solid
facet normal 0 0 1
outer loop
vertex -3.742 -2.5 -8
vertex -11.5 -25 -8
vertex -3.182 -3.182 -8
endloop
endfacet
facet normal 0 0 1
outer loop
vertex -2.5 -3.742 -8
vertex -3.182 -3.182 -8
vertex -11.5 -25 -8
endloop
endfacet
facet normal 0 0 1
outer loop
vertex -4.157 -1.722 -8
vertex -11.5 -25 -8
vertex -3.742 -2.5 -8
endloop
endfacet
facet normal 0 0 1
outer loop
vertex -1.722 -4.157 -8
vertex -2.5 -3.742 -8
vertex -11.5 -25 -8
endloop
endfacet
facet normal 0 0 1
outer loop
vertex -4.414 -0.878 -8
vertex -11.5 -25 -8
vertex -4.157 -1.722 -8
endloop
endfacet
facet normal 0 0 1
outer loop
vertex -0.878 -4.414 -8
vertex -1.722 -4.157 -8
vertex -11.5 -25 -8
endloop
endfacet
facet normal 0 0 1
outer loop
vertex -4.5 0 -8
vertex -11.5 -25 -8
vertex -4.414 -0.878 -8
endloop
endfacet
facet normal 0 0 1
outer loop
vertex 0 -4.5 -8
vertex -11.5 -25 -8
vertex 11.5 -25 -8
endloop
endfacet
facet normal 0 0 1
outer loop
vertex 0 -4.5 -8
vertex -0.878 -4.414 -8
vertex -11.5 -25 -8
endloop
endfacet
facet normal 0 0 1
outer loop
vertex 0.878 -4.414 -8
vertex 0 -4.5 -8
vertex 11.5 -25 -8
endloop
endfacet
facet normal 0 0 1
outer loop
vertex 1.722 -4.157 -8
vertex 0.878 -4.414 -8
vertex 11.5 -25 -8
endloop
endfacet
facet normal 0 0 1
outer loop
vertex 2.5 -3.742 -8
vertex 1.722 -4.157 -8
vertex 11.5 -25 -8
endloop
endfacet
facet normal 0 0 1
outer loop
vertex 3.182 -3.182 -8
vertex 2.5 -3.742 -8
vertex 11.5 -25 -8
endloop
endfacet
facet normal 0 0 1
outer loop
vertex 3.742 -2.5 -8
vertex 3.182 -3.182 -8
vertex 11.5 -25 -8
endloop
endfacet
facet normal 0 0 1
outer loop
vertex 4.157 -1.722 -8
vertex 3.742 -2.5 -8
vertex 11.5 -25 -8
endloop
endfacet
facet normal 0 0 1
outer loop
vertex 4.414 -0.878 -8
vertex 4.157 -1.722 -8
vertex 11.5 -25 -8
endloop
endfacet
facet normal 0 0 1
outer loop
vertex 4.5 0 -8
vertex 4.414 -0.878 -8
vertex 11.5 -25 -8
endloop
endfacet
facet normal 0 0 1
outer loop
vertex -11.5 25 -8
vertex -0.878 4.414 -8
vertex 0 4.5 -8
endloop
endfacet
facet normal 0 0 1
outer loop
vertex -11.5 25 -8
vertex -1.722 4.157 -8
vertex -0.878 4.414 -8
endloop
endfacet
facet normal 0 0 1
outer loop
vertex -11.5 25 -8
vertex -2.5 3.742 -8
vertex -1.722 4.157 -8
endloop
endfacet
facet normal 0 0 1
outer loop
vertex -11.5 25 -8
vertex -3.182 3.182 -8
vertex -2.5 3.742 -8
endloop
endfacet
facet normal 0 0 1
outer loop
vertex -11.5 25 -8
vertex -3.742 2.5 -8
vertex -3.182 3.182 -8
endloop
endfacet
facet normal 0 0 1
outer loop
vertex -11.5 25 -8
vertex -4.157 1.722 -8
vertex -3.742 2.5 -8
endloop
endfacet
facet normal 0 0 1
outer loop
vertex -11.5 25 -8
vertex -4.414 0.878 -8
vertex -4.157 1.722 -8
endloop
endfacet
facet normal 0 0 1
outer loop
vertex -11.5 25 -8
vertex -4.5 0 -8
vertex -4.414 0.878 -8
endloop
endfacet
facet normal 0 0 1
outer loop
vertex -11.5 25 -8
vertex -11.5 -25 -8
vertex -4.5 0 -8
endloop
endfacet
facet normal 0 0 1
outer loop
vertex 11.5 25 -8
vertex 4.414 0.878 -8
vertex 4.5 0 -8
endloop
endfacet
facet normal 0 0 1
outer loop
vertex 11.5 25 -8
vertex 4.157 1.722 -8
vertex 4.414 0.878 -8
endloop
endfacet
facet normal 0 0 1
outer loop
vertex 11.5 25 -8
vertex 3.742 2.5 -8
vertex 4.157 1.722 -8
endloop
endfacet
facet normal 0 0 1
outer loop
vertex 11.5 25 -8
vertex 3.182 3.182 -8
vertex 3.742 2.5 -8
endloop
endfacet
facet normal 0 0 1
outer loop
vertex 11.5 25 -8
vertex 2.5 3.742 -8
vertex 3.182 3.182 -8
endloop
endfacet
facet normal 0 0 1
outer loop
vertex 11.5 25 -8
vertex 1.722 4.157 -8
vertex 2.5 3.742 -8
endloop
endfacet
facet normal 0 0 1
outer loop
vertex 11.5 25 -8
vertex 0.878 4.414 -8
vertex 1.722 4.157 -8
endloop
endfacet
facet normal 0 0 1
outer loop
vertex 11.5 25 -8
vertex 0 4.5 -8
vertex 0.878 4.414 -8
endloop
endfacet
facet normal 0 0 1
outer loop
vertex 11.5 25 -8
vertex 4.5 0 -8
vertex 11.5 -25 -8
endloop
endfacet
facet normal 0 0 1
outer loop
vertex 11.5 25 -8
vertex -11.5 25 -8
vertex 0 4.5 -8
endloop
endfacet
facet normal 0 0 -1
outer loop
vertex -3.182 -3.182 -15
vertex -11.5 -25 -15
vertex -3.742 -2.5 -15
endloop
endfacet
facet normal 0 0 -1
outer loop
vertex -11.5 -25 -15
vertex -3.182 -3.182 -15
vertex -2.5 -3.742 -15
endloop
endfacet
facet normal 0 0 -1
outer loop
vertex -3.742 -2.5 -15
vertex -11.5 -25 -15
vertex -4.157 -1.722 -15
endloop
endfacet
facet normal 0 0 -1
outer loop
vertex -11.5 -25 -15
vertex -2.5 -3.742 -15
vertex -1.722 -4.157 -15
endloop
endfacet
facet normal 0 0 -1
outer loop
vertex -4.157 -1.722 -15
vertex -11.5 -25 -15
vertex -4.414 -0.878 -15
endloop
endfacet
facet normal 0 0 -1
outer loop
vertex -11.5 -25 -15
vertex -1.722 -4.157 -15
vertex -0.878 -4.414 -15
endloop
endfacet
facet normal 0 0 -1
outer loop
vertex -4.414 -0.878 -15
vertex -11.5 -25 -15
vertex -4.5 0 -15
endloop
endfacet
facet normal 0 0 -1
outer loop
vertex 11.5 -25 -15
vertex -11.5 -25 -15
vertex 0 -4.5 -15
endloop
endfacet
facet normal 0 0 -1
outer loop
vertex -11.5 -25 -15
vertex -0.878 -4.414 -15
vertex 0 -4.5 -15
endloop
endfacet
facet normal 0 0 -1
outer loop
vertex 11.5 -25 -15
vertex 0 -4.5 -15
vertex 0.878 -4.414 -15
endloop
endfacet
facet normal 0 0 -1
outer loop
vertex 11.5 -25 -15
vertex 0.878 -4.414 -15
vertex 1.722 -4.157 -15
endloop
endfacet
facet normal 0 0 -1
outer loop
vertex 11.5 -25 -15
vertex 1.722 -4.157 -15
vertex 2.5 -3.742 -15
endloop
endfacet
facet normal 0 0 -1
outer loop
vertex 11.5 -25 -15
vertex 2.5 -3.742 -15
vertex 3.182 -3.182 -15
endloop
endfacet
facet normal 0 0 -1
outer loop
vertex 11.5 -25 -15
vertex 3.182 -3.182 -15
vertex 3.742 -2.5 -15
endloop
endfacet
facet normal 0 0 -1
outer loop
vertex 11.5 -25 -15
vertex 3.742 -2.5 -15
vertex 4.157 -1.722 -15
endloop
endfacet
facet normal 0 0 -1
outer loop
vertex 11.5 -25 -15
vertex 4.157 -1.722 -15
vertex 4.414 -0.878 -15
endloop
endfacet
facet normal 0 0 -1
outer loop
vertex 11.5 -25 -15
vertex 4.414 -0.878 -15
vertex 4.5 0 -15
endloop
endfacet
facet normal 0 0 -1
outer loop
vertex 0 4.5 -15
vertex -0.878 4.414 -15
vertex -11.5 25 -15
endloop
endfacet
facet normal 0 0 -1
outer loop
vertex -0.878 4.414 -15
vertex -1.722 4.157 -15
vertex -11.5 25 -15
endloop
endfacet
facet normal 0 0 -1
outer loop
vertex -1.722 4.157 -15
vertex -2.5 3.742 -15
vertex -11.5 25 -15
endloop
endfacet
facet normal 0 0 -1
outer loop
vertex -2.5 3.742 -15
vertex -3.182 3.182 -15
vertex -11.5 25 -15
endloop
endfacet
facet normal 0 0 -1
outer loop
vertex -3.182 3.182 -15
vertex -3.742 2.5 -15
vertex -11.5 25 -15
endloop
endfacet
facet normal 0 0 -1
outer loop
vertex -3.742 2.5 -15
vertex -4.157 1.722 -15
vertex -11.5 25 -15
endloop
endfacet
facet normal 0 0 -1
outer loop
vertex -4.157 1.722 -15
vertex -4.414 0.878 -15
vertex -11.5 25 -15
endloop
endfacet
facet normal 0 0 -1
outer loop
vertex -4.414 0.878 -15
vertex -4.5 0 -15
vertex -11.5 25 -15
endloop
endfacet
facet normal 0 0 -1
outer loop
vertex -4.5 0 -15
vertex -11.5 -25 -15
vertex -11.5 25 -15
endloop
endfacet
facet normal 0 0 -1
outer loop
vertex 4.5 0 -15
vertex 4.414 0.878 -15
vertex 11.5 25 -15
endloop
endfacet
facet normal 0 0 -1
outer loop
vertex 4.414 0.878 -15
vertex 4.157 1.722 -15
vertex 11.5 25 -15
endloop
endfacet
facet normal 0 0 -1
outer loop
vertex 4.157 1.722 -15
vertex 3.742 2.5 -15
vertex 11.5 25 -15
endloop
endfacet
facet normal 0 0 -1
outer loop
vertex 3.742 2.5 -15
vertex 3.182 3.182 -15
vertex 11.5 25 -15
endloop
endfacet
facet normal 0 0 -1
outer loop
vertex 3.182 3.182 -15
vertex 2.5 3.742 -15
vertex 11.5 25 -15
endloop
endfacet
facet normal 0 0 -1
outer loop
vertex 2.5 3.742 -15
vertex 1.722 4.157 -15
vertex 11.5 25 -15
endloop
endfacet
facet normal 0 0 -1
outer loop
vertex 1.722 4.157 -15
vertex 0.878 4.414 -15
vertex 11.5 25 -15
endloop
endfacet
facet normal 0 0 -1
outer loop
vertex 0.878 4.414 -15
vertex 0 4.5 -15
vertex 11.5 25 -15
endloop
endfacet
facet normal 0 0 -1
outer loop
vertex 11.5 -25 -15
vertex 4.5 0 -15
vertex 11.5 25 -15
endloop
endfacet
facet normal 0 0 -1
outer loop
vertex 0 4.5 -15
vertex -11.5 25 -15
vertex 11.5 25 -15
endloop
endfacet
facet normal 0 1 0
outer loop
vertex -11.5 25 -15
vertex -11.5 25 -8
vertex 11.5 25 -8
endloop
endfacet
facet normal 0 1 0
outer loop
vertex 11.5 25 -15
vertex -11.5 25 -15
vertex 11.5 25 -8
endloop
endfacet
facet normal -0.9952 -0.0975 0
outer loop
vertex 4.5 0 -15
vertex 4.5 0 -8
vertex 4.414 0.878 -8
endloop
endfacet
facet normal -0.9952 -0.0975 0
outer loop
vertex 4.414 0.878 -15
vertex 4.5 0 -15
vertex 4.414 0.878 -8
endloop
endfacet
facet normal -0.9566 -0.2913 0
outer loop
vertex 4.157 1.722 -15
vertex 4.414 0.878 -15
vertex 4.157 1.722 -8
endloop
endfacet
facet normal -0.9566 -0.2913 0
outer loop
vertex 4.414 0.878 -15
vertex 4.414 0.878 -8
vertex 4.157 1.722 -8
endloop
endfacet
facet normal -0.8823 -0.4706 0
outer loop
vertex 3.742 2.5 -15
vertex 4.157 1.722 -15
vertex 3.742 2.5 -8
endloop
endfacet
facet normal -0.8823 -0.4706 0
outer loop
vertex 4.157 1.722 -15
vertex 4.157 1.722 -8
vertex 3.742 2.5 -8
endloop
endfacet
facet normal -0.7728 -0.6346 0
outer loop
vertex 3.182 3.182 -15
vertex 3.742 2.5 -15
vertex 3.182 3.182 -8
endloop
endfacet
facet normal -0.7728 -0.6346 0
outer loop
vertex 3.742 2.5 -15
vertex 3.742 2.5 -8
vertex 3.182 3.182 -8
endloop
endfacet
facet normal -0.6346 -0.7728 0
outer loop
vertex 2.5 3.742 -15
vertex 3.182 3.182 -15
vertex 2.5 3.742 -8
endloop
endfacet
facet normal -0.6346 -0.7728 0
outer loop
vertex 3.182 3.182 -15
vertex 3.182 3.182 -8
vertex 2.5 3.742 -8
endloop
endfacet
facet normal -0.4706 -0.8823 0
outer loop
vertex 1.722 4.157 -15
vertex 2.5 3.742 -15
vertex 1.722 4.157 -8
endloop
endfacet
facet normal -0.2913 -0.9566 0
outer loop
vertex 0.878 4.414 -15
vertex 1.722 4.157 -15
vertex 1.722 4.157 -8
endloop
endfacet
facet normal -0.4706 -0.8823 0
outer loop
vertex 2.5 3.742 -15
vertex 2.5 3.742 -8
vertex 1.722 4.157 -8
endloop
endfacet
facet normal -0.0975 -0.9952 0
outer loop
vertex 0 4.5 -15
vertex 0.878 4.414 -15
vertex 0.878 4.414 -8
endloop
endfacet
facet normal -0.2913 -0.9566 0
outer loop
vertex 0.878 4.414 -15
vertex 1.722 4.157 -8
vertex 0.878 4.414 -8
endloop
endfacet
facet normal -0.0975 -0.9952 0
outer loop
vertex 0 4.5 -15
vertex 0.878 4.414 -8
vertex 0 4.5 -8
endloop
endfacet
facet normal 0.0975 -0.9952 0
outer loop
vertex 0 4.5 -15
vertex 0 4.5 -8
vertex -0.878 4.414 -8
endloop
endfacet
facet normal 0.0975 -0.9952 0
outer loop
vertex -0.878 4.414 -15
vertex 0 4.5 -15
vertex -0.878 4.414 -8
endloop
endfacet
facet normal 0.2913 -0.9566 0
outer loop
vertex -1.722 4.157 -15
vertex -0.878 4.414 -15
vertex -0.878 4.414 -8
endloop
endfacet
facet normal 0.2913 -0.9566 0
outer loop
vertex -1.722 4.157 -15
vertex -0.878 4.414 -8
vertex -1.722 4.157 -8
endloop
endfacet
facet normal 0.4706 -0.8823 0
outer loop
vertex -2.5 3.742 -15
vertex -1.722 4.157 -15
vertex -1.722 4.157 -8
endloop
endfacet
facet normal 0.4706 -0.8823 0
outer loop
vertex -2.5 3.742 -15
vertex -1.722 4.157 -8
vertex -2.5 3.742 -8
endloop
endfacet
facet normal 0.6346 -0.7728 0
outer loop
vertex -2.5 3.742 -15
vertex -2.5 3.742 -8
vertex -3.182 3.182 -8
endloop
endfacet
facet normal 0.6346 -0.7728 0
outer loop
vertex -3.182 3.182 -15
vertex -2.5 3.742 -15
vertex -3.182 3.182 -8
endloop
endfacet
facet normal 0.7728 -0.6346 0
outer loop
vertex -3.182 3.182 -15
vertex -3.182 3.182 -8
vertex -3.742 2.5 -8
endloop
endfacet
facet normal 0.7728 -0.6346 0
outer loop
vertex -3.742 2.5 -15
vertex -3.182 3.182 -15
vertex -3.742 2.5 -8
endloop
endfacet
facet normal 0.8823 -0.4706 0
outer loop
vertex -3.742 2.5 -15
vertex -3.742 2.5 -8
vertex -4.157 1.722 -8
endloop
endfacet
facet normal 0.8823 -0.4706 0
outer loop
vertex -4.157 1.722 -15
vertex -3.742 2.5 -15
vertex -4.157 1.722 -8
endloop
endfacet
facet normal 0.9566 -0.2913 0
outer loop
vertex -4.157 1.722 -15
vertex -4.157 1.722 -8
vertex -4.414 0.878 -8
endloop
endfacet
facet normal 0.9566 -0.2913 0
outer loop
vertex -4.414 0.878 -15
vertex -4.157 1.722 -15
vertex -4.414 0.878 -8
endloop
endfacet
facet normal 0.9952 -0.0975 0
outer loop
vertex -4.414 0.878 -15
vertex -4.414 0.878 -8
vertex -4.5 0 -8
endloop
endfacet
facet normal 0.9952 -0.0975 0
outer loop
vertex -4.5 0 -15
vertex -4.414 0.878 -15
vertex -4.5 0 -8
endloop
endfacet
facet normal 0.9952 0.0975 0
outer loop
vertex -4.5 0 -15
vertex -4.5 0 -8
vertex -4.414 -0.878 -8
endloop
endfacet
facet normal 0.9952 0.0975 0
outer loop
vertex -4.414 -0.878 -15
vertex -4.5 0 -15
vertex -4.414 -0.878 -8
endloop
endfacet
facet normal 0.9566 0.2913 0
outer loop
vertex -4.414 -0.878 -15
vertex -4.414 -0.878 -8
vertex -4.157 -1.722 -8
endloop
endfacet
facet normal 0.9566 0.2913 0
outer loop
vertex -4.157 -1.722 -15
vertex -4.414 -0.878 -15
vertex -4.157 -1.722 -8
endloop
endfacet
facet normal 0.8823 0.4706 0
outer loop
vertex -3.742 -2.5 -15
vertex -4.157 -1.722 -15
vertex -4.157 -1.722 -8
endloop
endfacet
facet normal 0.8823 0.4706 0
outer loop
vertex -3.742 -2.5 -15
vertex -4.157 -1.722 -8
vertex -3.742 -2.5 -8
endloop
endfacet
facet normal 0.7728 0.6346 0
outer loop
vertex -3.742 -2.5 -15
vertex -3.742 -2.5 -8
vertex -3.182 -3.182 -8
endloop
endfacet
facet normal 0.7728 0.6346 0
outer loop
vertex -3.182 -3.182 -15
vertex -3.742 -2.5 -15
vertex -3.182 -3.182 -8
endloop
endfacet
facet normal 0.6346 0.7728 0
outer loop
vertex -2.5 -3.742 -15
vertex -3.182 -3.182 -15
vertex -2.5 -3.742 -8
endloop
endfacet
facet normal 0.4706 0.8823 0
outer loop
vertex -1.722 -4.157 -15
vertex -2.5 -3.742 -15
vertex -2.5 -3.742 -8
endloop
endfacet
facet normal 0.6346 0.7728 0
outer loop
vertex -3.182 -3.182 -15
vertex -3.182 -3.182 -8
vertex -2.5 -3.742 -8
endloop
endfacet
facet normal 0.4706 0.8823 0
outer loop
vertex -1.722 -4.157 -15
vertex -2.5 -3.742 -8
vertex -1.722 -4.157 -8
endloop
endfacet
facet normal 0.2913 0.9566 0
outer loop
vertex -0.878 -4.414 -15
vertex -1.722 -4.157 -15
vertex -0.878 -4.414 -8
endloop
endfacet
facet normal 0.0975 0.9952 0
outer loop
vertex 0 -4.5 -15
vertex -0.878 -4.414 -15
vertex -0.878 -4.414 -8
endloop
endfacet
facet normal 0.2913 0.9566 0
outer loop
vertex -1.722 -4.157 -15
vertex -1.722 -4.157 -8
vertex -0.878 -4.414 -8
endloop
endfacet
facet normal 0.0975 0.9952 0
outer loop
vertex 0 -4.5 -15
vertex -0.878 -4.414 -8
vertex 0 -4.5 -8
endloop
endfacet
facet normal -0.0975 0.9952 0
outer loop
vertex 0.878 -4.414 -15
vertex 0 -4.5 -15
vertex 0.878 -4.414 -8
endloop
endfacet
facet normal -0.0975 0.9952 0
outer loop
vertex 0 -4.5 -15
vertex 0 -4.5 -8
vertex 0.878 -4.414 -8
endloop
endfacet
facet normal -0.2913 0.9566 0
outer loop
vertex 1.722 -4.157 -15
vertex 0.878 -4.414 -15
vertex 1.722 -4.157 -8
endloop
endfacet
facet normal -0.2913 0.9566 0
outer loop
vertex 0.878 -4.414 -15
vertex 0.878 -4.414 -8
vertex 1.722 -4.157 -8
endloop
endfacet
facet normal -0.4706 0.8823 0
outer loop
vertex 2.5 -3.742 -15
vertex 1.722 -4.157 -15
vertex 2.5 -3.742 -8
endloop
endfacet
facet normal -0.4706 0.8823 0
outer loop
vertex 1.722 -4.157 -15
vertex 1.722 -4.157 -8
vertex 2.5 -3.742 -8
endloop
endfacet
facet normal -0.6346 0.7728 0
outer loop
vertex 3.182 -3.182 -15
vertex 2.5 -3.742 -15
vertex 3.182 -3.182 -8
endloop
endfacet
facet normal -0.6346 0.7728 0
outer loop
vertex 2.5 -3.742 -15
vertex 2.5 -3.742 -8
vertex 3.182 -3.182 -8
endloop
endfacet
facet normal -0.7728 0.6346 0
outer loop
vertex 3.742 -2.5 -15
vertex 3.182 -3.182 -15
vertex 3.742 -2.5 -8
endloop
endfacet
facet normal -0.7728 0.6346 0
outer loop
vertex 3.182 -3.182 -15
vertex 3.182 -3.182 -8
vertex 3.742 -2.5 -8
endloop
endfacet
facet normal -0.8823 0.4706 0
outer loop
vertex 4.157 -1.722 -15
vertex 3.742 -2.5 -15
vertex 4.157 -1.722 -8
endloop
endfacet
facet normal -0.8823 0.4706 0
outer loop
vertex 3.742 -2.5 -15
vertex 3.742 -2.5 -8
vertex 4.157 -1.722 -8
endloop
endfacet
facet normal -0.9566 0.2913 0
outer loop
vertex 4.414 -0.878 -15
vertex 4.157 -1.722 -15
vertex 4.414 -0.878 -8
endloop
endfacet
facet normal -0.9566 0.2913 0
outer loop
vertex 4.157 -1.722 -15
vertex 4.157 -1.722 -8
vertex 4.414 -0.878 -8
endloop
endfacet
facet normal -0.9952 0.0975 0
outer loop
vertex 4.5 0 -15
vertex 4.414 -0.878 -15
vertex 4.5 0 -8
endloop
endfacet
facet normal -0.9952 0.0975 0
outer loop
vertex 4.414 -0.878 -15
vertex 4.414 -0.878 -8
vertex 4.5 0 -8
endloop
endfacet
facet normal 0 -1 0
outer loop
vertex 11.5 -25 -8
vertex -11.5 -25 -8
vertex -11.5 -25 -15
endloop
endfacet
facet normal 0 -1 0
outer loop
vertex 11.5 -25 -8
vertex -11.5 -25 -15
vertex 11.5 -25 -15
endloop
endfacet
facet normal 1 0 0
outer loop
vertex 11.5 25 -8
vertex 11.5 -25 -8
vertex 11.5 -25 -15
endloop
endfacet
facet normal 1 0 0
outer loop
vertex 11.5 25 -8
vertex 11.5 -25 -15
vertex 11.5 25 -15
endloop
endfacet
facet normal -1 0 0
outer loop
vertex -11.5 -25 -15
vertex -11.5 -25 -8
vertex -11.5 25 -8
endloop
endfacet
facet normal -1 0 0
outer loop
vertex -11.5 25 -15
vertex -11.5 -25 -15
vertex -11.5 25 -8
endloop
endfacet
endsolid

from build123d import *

# Parameters (mm, degrees)
F0_W     = 23
F0_H     = 50
F1_DEPTH = 15
F4_R     = 4.5
F5_DEPTH = 16
F6_W     = 23
F6_H     = 50
F7_DEPTH = 8


# Not quite as in the source:
# - a feature of the source that left no trace in its solid (it failed there, or was rolled back) is left out


with BuildPart() as f1:
    # F0 (on Top) → F1 (new body)
    with BuildSketch(Plane.XY):
        Rectangle(F0_W, F0_H)
    extrude(amount=-F1_DEPTH)

    # F4 (on face) → F5 (cut)
    with BuildSketch(Plane.XY):
        Circle(F4_R)
    extrude(amount=-F5_DEPTH, mode=Mode.SUBTRACT)

    # F6 (on face) → F7 (cut)
    with BuildSketch(Plane.XY):
        Rectangle(F6_W, F6_H)
    extrude(amount=-F7_DEPTH, mode=Mode.SUBTRACT)


solid = f1.part
